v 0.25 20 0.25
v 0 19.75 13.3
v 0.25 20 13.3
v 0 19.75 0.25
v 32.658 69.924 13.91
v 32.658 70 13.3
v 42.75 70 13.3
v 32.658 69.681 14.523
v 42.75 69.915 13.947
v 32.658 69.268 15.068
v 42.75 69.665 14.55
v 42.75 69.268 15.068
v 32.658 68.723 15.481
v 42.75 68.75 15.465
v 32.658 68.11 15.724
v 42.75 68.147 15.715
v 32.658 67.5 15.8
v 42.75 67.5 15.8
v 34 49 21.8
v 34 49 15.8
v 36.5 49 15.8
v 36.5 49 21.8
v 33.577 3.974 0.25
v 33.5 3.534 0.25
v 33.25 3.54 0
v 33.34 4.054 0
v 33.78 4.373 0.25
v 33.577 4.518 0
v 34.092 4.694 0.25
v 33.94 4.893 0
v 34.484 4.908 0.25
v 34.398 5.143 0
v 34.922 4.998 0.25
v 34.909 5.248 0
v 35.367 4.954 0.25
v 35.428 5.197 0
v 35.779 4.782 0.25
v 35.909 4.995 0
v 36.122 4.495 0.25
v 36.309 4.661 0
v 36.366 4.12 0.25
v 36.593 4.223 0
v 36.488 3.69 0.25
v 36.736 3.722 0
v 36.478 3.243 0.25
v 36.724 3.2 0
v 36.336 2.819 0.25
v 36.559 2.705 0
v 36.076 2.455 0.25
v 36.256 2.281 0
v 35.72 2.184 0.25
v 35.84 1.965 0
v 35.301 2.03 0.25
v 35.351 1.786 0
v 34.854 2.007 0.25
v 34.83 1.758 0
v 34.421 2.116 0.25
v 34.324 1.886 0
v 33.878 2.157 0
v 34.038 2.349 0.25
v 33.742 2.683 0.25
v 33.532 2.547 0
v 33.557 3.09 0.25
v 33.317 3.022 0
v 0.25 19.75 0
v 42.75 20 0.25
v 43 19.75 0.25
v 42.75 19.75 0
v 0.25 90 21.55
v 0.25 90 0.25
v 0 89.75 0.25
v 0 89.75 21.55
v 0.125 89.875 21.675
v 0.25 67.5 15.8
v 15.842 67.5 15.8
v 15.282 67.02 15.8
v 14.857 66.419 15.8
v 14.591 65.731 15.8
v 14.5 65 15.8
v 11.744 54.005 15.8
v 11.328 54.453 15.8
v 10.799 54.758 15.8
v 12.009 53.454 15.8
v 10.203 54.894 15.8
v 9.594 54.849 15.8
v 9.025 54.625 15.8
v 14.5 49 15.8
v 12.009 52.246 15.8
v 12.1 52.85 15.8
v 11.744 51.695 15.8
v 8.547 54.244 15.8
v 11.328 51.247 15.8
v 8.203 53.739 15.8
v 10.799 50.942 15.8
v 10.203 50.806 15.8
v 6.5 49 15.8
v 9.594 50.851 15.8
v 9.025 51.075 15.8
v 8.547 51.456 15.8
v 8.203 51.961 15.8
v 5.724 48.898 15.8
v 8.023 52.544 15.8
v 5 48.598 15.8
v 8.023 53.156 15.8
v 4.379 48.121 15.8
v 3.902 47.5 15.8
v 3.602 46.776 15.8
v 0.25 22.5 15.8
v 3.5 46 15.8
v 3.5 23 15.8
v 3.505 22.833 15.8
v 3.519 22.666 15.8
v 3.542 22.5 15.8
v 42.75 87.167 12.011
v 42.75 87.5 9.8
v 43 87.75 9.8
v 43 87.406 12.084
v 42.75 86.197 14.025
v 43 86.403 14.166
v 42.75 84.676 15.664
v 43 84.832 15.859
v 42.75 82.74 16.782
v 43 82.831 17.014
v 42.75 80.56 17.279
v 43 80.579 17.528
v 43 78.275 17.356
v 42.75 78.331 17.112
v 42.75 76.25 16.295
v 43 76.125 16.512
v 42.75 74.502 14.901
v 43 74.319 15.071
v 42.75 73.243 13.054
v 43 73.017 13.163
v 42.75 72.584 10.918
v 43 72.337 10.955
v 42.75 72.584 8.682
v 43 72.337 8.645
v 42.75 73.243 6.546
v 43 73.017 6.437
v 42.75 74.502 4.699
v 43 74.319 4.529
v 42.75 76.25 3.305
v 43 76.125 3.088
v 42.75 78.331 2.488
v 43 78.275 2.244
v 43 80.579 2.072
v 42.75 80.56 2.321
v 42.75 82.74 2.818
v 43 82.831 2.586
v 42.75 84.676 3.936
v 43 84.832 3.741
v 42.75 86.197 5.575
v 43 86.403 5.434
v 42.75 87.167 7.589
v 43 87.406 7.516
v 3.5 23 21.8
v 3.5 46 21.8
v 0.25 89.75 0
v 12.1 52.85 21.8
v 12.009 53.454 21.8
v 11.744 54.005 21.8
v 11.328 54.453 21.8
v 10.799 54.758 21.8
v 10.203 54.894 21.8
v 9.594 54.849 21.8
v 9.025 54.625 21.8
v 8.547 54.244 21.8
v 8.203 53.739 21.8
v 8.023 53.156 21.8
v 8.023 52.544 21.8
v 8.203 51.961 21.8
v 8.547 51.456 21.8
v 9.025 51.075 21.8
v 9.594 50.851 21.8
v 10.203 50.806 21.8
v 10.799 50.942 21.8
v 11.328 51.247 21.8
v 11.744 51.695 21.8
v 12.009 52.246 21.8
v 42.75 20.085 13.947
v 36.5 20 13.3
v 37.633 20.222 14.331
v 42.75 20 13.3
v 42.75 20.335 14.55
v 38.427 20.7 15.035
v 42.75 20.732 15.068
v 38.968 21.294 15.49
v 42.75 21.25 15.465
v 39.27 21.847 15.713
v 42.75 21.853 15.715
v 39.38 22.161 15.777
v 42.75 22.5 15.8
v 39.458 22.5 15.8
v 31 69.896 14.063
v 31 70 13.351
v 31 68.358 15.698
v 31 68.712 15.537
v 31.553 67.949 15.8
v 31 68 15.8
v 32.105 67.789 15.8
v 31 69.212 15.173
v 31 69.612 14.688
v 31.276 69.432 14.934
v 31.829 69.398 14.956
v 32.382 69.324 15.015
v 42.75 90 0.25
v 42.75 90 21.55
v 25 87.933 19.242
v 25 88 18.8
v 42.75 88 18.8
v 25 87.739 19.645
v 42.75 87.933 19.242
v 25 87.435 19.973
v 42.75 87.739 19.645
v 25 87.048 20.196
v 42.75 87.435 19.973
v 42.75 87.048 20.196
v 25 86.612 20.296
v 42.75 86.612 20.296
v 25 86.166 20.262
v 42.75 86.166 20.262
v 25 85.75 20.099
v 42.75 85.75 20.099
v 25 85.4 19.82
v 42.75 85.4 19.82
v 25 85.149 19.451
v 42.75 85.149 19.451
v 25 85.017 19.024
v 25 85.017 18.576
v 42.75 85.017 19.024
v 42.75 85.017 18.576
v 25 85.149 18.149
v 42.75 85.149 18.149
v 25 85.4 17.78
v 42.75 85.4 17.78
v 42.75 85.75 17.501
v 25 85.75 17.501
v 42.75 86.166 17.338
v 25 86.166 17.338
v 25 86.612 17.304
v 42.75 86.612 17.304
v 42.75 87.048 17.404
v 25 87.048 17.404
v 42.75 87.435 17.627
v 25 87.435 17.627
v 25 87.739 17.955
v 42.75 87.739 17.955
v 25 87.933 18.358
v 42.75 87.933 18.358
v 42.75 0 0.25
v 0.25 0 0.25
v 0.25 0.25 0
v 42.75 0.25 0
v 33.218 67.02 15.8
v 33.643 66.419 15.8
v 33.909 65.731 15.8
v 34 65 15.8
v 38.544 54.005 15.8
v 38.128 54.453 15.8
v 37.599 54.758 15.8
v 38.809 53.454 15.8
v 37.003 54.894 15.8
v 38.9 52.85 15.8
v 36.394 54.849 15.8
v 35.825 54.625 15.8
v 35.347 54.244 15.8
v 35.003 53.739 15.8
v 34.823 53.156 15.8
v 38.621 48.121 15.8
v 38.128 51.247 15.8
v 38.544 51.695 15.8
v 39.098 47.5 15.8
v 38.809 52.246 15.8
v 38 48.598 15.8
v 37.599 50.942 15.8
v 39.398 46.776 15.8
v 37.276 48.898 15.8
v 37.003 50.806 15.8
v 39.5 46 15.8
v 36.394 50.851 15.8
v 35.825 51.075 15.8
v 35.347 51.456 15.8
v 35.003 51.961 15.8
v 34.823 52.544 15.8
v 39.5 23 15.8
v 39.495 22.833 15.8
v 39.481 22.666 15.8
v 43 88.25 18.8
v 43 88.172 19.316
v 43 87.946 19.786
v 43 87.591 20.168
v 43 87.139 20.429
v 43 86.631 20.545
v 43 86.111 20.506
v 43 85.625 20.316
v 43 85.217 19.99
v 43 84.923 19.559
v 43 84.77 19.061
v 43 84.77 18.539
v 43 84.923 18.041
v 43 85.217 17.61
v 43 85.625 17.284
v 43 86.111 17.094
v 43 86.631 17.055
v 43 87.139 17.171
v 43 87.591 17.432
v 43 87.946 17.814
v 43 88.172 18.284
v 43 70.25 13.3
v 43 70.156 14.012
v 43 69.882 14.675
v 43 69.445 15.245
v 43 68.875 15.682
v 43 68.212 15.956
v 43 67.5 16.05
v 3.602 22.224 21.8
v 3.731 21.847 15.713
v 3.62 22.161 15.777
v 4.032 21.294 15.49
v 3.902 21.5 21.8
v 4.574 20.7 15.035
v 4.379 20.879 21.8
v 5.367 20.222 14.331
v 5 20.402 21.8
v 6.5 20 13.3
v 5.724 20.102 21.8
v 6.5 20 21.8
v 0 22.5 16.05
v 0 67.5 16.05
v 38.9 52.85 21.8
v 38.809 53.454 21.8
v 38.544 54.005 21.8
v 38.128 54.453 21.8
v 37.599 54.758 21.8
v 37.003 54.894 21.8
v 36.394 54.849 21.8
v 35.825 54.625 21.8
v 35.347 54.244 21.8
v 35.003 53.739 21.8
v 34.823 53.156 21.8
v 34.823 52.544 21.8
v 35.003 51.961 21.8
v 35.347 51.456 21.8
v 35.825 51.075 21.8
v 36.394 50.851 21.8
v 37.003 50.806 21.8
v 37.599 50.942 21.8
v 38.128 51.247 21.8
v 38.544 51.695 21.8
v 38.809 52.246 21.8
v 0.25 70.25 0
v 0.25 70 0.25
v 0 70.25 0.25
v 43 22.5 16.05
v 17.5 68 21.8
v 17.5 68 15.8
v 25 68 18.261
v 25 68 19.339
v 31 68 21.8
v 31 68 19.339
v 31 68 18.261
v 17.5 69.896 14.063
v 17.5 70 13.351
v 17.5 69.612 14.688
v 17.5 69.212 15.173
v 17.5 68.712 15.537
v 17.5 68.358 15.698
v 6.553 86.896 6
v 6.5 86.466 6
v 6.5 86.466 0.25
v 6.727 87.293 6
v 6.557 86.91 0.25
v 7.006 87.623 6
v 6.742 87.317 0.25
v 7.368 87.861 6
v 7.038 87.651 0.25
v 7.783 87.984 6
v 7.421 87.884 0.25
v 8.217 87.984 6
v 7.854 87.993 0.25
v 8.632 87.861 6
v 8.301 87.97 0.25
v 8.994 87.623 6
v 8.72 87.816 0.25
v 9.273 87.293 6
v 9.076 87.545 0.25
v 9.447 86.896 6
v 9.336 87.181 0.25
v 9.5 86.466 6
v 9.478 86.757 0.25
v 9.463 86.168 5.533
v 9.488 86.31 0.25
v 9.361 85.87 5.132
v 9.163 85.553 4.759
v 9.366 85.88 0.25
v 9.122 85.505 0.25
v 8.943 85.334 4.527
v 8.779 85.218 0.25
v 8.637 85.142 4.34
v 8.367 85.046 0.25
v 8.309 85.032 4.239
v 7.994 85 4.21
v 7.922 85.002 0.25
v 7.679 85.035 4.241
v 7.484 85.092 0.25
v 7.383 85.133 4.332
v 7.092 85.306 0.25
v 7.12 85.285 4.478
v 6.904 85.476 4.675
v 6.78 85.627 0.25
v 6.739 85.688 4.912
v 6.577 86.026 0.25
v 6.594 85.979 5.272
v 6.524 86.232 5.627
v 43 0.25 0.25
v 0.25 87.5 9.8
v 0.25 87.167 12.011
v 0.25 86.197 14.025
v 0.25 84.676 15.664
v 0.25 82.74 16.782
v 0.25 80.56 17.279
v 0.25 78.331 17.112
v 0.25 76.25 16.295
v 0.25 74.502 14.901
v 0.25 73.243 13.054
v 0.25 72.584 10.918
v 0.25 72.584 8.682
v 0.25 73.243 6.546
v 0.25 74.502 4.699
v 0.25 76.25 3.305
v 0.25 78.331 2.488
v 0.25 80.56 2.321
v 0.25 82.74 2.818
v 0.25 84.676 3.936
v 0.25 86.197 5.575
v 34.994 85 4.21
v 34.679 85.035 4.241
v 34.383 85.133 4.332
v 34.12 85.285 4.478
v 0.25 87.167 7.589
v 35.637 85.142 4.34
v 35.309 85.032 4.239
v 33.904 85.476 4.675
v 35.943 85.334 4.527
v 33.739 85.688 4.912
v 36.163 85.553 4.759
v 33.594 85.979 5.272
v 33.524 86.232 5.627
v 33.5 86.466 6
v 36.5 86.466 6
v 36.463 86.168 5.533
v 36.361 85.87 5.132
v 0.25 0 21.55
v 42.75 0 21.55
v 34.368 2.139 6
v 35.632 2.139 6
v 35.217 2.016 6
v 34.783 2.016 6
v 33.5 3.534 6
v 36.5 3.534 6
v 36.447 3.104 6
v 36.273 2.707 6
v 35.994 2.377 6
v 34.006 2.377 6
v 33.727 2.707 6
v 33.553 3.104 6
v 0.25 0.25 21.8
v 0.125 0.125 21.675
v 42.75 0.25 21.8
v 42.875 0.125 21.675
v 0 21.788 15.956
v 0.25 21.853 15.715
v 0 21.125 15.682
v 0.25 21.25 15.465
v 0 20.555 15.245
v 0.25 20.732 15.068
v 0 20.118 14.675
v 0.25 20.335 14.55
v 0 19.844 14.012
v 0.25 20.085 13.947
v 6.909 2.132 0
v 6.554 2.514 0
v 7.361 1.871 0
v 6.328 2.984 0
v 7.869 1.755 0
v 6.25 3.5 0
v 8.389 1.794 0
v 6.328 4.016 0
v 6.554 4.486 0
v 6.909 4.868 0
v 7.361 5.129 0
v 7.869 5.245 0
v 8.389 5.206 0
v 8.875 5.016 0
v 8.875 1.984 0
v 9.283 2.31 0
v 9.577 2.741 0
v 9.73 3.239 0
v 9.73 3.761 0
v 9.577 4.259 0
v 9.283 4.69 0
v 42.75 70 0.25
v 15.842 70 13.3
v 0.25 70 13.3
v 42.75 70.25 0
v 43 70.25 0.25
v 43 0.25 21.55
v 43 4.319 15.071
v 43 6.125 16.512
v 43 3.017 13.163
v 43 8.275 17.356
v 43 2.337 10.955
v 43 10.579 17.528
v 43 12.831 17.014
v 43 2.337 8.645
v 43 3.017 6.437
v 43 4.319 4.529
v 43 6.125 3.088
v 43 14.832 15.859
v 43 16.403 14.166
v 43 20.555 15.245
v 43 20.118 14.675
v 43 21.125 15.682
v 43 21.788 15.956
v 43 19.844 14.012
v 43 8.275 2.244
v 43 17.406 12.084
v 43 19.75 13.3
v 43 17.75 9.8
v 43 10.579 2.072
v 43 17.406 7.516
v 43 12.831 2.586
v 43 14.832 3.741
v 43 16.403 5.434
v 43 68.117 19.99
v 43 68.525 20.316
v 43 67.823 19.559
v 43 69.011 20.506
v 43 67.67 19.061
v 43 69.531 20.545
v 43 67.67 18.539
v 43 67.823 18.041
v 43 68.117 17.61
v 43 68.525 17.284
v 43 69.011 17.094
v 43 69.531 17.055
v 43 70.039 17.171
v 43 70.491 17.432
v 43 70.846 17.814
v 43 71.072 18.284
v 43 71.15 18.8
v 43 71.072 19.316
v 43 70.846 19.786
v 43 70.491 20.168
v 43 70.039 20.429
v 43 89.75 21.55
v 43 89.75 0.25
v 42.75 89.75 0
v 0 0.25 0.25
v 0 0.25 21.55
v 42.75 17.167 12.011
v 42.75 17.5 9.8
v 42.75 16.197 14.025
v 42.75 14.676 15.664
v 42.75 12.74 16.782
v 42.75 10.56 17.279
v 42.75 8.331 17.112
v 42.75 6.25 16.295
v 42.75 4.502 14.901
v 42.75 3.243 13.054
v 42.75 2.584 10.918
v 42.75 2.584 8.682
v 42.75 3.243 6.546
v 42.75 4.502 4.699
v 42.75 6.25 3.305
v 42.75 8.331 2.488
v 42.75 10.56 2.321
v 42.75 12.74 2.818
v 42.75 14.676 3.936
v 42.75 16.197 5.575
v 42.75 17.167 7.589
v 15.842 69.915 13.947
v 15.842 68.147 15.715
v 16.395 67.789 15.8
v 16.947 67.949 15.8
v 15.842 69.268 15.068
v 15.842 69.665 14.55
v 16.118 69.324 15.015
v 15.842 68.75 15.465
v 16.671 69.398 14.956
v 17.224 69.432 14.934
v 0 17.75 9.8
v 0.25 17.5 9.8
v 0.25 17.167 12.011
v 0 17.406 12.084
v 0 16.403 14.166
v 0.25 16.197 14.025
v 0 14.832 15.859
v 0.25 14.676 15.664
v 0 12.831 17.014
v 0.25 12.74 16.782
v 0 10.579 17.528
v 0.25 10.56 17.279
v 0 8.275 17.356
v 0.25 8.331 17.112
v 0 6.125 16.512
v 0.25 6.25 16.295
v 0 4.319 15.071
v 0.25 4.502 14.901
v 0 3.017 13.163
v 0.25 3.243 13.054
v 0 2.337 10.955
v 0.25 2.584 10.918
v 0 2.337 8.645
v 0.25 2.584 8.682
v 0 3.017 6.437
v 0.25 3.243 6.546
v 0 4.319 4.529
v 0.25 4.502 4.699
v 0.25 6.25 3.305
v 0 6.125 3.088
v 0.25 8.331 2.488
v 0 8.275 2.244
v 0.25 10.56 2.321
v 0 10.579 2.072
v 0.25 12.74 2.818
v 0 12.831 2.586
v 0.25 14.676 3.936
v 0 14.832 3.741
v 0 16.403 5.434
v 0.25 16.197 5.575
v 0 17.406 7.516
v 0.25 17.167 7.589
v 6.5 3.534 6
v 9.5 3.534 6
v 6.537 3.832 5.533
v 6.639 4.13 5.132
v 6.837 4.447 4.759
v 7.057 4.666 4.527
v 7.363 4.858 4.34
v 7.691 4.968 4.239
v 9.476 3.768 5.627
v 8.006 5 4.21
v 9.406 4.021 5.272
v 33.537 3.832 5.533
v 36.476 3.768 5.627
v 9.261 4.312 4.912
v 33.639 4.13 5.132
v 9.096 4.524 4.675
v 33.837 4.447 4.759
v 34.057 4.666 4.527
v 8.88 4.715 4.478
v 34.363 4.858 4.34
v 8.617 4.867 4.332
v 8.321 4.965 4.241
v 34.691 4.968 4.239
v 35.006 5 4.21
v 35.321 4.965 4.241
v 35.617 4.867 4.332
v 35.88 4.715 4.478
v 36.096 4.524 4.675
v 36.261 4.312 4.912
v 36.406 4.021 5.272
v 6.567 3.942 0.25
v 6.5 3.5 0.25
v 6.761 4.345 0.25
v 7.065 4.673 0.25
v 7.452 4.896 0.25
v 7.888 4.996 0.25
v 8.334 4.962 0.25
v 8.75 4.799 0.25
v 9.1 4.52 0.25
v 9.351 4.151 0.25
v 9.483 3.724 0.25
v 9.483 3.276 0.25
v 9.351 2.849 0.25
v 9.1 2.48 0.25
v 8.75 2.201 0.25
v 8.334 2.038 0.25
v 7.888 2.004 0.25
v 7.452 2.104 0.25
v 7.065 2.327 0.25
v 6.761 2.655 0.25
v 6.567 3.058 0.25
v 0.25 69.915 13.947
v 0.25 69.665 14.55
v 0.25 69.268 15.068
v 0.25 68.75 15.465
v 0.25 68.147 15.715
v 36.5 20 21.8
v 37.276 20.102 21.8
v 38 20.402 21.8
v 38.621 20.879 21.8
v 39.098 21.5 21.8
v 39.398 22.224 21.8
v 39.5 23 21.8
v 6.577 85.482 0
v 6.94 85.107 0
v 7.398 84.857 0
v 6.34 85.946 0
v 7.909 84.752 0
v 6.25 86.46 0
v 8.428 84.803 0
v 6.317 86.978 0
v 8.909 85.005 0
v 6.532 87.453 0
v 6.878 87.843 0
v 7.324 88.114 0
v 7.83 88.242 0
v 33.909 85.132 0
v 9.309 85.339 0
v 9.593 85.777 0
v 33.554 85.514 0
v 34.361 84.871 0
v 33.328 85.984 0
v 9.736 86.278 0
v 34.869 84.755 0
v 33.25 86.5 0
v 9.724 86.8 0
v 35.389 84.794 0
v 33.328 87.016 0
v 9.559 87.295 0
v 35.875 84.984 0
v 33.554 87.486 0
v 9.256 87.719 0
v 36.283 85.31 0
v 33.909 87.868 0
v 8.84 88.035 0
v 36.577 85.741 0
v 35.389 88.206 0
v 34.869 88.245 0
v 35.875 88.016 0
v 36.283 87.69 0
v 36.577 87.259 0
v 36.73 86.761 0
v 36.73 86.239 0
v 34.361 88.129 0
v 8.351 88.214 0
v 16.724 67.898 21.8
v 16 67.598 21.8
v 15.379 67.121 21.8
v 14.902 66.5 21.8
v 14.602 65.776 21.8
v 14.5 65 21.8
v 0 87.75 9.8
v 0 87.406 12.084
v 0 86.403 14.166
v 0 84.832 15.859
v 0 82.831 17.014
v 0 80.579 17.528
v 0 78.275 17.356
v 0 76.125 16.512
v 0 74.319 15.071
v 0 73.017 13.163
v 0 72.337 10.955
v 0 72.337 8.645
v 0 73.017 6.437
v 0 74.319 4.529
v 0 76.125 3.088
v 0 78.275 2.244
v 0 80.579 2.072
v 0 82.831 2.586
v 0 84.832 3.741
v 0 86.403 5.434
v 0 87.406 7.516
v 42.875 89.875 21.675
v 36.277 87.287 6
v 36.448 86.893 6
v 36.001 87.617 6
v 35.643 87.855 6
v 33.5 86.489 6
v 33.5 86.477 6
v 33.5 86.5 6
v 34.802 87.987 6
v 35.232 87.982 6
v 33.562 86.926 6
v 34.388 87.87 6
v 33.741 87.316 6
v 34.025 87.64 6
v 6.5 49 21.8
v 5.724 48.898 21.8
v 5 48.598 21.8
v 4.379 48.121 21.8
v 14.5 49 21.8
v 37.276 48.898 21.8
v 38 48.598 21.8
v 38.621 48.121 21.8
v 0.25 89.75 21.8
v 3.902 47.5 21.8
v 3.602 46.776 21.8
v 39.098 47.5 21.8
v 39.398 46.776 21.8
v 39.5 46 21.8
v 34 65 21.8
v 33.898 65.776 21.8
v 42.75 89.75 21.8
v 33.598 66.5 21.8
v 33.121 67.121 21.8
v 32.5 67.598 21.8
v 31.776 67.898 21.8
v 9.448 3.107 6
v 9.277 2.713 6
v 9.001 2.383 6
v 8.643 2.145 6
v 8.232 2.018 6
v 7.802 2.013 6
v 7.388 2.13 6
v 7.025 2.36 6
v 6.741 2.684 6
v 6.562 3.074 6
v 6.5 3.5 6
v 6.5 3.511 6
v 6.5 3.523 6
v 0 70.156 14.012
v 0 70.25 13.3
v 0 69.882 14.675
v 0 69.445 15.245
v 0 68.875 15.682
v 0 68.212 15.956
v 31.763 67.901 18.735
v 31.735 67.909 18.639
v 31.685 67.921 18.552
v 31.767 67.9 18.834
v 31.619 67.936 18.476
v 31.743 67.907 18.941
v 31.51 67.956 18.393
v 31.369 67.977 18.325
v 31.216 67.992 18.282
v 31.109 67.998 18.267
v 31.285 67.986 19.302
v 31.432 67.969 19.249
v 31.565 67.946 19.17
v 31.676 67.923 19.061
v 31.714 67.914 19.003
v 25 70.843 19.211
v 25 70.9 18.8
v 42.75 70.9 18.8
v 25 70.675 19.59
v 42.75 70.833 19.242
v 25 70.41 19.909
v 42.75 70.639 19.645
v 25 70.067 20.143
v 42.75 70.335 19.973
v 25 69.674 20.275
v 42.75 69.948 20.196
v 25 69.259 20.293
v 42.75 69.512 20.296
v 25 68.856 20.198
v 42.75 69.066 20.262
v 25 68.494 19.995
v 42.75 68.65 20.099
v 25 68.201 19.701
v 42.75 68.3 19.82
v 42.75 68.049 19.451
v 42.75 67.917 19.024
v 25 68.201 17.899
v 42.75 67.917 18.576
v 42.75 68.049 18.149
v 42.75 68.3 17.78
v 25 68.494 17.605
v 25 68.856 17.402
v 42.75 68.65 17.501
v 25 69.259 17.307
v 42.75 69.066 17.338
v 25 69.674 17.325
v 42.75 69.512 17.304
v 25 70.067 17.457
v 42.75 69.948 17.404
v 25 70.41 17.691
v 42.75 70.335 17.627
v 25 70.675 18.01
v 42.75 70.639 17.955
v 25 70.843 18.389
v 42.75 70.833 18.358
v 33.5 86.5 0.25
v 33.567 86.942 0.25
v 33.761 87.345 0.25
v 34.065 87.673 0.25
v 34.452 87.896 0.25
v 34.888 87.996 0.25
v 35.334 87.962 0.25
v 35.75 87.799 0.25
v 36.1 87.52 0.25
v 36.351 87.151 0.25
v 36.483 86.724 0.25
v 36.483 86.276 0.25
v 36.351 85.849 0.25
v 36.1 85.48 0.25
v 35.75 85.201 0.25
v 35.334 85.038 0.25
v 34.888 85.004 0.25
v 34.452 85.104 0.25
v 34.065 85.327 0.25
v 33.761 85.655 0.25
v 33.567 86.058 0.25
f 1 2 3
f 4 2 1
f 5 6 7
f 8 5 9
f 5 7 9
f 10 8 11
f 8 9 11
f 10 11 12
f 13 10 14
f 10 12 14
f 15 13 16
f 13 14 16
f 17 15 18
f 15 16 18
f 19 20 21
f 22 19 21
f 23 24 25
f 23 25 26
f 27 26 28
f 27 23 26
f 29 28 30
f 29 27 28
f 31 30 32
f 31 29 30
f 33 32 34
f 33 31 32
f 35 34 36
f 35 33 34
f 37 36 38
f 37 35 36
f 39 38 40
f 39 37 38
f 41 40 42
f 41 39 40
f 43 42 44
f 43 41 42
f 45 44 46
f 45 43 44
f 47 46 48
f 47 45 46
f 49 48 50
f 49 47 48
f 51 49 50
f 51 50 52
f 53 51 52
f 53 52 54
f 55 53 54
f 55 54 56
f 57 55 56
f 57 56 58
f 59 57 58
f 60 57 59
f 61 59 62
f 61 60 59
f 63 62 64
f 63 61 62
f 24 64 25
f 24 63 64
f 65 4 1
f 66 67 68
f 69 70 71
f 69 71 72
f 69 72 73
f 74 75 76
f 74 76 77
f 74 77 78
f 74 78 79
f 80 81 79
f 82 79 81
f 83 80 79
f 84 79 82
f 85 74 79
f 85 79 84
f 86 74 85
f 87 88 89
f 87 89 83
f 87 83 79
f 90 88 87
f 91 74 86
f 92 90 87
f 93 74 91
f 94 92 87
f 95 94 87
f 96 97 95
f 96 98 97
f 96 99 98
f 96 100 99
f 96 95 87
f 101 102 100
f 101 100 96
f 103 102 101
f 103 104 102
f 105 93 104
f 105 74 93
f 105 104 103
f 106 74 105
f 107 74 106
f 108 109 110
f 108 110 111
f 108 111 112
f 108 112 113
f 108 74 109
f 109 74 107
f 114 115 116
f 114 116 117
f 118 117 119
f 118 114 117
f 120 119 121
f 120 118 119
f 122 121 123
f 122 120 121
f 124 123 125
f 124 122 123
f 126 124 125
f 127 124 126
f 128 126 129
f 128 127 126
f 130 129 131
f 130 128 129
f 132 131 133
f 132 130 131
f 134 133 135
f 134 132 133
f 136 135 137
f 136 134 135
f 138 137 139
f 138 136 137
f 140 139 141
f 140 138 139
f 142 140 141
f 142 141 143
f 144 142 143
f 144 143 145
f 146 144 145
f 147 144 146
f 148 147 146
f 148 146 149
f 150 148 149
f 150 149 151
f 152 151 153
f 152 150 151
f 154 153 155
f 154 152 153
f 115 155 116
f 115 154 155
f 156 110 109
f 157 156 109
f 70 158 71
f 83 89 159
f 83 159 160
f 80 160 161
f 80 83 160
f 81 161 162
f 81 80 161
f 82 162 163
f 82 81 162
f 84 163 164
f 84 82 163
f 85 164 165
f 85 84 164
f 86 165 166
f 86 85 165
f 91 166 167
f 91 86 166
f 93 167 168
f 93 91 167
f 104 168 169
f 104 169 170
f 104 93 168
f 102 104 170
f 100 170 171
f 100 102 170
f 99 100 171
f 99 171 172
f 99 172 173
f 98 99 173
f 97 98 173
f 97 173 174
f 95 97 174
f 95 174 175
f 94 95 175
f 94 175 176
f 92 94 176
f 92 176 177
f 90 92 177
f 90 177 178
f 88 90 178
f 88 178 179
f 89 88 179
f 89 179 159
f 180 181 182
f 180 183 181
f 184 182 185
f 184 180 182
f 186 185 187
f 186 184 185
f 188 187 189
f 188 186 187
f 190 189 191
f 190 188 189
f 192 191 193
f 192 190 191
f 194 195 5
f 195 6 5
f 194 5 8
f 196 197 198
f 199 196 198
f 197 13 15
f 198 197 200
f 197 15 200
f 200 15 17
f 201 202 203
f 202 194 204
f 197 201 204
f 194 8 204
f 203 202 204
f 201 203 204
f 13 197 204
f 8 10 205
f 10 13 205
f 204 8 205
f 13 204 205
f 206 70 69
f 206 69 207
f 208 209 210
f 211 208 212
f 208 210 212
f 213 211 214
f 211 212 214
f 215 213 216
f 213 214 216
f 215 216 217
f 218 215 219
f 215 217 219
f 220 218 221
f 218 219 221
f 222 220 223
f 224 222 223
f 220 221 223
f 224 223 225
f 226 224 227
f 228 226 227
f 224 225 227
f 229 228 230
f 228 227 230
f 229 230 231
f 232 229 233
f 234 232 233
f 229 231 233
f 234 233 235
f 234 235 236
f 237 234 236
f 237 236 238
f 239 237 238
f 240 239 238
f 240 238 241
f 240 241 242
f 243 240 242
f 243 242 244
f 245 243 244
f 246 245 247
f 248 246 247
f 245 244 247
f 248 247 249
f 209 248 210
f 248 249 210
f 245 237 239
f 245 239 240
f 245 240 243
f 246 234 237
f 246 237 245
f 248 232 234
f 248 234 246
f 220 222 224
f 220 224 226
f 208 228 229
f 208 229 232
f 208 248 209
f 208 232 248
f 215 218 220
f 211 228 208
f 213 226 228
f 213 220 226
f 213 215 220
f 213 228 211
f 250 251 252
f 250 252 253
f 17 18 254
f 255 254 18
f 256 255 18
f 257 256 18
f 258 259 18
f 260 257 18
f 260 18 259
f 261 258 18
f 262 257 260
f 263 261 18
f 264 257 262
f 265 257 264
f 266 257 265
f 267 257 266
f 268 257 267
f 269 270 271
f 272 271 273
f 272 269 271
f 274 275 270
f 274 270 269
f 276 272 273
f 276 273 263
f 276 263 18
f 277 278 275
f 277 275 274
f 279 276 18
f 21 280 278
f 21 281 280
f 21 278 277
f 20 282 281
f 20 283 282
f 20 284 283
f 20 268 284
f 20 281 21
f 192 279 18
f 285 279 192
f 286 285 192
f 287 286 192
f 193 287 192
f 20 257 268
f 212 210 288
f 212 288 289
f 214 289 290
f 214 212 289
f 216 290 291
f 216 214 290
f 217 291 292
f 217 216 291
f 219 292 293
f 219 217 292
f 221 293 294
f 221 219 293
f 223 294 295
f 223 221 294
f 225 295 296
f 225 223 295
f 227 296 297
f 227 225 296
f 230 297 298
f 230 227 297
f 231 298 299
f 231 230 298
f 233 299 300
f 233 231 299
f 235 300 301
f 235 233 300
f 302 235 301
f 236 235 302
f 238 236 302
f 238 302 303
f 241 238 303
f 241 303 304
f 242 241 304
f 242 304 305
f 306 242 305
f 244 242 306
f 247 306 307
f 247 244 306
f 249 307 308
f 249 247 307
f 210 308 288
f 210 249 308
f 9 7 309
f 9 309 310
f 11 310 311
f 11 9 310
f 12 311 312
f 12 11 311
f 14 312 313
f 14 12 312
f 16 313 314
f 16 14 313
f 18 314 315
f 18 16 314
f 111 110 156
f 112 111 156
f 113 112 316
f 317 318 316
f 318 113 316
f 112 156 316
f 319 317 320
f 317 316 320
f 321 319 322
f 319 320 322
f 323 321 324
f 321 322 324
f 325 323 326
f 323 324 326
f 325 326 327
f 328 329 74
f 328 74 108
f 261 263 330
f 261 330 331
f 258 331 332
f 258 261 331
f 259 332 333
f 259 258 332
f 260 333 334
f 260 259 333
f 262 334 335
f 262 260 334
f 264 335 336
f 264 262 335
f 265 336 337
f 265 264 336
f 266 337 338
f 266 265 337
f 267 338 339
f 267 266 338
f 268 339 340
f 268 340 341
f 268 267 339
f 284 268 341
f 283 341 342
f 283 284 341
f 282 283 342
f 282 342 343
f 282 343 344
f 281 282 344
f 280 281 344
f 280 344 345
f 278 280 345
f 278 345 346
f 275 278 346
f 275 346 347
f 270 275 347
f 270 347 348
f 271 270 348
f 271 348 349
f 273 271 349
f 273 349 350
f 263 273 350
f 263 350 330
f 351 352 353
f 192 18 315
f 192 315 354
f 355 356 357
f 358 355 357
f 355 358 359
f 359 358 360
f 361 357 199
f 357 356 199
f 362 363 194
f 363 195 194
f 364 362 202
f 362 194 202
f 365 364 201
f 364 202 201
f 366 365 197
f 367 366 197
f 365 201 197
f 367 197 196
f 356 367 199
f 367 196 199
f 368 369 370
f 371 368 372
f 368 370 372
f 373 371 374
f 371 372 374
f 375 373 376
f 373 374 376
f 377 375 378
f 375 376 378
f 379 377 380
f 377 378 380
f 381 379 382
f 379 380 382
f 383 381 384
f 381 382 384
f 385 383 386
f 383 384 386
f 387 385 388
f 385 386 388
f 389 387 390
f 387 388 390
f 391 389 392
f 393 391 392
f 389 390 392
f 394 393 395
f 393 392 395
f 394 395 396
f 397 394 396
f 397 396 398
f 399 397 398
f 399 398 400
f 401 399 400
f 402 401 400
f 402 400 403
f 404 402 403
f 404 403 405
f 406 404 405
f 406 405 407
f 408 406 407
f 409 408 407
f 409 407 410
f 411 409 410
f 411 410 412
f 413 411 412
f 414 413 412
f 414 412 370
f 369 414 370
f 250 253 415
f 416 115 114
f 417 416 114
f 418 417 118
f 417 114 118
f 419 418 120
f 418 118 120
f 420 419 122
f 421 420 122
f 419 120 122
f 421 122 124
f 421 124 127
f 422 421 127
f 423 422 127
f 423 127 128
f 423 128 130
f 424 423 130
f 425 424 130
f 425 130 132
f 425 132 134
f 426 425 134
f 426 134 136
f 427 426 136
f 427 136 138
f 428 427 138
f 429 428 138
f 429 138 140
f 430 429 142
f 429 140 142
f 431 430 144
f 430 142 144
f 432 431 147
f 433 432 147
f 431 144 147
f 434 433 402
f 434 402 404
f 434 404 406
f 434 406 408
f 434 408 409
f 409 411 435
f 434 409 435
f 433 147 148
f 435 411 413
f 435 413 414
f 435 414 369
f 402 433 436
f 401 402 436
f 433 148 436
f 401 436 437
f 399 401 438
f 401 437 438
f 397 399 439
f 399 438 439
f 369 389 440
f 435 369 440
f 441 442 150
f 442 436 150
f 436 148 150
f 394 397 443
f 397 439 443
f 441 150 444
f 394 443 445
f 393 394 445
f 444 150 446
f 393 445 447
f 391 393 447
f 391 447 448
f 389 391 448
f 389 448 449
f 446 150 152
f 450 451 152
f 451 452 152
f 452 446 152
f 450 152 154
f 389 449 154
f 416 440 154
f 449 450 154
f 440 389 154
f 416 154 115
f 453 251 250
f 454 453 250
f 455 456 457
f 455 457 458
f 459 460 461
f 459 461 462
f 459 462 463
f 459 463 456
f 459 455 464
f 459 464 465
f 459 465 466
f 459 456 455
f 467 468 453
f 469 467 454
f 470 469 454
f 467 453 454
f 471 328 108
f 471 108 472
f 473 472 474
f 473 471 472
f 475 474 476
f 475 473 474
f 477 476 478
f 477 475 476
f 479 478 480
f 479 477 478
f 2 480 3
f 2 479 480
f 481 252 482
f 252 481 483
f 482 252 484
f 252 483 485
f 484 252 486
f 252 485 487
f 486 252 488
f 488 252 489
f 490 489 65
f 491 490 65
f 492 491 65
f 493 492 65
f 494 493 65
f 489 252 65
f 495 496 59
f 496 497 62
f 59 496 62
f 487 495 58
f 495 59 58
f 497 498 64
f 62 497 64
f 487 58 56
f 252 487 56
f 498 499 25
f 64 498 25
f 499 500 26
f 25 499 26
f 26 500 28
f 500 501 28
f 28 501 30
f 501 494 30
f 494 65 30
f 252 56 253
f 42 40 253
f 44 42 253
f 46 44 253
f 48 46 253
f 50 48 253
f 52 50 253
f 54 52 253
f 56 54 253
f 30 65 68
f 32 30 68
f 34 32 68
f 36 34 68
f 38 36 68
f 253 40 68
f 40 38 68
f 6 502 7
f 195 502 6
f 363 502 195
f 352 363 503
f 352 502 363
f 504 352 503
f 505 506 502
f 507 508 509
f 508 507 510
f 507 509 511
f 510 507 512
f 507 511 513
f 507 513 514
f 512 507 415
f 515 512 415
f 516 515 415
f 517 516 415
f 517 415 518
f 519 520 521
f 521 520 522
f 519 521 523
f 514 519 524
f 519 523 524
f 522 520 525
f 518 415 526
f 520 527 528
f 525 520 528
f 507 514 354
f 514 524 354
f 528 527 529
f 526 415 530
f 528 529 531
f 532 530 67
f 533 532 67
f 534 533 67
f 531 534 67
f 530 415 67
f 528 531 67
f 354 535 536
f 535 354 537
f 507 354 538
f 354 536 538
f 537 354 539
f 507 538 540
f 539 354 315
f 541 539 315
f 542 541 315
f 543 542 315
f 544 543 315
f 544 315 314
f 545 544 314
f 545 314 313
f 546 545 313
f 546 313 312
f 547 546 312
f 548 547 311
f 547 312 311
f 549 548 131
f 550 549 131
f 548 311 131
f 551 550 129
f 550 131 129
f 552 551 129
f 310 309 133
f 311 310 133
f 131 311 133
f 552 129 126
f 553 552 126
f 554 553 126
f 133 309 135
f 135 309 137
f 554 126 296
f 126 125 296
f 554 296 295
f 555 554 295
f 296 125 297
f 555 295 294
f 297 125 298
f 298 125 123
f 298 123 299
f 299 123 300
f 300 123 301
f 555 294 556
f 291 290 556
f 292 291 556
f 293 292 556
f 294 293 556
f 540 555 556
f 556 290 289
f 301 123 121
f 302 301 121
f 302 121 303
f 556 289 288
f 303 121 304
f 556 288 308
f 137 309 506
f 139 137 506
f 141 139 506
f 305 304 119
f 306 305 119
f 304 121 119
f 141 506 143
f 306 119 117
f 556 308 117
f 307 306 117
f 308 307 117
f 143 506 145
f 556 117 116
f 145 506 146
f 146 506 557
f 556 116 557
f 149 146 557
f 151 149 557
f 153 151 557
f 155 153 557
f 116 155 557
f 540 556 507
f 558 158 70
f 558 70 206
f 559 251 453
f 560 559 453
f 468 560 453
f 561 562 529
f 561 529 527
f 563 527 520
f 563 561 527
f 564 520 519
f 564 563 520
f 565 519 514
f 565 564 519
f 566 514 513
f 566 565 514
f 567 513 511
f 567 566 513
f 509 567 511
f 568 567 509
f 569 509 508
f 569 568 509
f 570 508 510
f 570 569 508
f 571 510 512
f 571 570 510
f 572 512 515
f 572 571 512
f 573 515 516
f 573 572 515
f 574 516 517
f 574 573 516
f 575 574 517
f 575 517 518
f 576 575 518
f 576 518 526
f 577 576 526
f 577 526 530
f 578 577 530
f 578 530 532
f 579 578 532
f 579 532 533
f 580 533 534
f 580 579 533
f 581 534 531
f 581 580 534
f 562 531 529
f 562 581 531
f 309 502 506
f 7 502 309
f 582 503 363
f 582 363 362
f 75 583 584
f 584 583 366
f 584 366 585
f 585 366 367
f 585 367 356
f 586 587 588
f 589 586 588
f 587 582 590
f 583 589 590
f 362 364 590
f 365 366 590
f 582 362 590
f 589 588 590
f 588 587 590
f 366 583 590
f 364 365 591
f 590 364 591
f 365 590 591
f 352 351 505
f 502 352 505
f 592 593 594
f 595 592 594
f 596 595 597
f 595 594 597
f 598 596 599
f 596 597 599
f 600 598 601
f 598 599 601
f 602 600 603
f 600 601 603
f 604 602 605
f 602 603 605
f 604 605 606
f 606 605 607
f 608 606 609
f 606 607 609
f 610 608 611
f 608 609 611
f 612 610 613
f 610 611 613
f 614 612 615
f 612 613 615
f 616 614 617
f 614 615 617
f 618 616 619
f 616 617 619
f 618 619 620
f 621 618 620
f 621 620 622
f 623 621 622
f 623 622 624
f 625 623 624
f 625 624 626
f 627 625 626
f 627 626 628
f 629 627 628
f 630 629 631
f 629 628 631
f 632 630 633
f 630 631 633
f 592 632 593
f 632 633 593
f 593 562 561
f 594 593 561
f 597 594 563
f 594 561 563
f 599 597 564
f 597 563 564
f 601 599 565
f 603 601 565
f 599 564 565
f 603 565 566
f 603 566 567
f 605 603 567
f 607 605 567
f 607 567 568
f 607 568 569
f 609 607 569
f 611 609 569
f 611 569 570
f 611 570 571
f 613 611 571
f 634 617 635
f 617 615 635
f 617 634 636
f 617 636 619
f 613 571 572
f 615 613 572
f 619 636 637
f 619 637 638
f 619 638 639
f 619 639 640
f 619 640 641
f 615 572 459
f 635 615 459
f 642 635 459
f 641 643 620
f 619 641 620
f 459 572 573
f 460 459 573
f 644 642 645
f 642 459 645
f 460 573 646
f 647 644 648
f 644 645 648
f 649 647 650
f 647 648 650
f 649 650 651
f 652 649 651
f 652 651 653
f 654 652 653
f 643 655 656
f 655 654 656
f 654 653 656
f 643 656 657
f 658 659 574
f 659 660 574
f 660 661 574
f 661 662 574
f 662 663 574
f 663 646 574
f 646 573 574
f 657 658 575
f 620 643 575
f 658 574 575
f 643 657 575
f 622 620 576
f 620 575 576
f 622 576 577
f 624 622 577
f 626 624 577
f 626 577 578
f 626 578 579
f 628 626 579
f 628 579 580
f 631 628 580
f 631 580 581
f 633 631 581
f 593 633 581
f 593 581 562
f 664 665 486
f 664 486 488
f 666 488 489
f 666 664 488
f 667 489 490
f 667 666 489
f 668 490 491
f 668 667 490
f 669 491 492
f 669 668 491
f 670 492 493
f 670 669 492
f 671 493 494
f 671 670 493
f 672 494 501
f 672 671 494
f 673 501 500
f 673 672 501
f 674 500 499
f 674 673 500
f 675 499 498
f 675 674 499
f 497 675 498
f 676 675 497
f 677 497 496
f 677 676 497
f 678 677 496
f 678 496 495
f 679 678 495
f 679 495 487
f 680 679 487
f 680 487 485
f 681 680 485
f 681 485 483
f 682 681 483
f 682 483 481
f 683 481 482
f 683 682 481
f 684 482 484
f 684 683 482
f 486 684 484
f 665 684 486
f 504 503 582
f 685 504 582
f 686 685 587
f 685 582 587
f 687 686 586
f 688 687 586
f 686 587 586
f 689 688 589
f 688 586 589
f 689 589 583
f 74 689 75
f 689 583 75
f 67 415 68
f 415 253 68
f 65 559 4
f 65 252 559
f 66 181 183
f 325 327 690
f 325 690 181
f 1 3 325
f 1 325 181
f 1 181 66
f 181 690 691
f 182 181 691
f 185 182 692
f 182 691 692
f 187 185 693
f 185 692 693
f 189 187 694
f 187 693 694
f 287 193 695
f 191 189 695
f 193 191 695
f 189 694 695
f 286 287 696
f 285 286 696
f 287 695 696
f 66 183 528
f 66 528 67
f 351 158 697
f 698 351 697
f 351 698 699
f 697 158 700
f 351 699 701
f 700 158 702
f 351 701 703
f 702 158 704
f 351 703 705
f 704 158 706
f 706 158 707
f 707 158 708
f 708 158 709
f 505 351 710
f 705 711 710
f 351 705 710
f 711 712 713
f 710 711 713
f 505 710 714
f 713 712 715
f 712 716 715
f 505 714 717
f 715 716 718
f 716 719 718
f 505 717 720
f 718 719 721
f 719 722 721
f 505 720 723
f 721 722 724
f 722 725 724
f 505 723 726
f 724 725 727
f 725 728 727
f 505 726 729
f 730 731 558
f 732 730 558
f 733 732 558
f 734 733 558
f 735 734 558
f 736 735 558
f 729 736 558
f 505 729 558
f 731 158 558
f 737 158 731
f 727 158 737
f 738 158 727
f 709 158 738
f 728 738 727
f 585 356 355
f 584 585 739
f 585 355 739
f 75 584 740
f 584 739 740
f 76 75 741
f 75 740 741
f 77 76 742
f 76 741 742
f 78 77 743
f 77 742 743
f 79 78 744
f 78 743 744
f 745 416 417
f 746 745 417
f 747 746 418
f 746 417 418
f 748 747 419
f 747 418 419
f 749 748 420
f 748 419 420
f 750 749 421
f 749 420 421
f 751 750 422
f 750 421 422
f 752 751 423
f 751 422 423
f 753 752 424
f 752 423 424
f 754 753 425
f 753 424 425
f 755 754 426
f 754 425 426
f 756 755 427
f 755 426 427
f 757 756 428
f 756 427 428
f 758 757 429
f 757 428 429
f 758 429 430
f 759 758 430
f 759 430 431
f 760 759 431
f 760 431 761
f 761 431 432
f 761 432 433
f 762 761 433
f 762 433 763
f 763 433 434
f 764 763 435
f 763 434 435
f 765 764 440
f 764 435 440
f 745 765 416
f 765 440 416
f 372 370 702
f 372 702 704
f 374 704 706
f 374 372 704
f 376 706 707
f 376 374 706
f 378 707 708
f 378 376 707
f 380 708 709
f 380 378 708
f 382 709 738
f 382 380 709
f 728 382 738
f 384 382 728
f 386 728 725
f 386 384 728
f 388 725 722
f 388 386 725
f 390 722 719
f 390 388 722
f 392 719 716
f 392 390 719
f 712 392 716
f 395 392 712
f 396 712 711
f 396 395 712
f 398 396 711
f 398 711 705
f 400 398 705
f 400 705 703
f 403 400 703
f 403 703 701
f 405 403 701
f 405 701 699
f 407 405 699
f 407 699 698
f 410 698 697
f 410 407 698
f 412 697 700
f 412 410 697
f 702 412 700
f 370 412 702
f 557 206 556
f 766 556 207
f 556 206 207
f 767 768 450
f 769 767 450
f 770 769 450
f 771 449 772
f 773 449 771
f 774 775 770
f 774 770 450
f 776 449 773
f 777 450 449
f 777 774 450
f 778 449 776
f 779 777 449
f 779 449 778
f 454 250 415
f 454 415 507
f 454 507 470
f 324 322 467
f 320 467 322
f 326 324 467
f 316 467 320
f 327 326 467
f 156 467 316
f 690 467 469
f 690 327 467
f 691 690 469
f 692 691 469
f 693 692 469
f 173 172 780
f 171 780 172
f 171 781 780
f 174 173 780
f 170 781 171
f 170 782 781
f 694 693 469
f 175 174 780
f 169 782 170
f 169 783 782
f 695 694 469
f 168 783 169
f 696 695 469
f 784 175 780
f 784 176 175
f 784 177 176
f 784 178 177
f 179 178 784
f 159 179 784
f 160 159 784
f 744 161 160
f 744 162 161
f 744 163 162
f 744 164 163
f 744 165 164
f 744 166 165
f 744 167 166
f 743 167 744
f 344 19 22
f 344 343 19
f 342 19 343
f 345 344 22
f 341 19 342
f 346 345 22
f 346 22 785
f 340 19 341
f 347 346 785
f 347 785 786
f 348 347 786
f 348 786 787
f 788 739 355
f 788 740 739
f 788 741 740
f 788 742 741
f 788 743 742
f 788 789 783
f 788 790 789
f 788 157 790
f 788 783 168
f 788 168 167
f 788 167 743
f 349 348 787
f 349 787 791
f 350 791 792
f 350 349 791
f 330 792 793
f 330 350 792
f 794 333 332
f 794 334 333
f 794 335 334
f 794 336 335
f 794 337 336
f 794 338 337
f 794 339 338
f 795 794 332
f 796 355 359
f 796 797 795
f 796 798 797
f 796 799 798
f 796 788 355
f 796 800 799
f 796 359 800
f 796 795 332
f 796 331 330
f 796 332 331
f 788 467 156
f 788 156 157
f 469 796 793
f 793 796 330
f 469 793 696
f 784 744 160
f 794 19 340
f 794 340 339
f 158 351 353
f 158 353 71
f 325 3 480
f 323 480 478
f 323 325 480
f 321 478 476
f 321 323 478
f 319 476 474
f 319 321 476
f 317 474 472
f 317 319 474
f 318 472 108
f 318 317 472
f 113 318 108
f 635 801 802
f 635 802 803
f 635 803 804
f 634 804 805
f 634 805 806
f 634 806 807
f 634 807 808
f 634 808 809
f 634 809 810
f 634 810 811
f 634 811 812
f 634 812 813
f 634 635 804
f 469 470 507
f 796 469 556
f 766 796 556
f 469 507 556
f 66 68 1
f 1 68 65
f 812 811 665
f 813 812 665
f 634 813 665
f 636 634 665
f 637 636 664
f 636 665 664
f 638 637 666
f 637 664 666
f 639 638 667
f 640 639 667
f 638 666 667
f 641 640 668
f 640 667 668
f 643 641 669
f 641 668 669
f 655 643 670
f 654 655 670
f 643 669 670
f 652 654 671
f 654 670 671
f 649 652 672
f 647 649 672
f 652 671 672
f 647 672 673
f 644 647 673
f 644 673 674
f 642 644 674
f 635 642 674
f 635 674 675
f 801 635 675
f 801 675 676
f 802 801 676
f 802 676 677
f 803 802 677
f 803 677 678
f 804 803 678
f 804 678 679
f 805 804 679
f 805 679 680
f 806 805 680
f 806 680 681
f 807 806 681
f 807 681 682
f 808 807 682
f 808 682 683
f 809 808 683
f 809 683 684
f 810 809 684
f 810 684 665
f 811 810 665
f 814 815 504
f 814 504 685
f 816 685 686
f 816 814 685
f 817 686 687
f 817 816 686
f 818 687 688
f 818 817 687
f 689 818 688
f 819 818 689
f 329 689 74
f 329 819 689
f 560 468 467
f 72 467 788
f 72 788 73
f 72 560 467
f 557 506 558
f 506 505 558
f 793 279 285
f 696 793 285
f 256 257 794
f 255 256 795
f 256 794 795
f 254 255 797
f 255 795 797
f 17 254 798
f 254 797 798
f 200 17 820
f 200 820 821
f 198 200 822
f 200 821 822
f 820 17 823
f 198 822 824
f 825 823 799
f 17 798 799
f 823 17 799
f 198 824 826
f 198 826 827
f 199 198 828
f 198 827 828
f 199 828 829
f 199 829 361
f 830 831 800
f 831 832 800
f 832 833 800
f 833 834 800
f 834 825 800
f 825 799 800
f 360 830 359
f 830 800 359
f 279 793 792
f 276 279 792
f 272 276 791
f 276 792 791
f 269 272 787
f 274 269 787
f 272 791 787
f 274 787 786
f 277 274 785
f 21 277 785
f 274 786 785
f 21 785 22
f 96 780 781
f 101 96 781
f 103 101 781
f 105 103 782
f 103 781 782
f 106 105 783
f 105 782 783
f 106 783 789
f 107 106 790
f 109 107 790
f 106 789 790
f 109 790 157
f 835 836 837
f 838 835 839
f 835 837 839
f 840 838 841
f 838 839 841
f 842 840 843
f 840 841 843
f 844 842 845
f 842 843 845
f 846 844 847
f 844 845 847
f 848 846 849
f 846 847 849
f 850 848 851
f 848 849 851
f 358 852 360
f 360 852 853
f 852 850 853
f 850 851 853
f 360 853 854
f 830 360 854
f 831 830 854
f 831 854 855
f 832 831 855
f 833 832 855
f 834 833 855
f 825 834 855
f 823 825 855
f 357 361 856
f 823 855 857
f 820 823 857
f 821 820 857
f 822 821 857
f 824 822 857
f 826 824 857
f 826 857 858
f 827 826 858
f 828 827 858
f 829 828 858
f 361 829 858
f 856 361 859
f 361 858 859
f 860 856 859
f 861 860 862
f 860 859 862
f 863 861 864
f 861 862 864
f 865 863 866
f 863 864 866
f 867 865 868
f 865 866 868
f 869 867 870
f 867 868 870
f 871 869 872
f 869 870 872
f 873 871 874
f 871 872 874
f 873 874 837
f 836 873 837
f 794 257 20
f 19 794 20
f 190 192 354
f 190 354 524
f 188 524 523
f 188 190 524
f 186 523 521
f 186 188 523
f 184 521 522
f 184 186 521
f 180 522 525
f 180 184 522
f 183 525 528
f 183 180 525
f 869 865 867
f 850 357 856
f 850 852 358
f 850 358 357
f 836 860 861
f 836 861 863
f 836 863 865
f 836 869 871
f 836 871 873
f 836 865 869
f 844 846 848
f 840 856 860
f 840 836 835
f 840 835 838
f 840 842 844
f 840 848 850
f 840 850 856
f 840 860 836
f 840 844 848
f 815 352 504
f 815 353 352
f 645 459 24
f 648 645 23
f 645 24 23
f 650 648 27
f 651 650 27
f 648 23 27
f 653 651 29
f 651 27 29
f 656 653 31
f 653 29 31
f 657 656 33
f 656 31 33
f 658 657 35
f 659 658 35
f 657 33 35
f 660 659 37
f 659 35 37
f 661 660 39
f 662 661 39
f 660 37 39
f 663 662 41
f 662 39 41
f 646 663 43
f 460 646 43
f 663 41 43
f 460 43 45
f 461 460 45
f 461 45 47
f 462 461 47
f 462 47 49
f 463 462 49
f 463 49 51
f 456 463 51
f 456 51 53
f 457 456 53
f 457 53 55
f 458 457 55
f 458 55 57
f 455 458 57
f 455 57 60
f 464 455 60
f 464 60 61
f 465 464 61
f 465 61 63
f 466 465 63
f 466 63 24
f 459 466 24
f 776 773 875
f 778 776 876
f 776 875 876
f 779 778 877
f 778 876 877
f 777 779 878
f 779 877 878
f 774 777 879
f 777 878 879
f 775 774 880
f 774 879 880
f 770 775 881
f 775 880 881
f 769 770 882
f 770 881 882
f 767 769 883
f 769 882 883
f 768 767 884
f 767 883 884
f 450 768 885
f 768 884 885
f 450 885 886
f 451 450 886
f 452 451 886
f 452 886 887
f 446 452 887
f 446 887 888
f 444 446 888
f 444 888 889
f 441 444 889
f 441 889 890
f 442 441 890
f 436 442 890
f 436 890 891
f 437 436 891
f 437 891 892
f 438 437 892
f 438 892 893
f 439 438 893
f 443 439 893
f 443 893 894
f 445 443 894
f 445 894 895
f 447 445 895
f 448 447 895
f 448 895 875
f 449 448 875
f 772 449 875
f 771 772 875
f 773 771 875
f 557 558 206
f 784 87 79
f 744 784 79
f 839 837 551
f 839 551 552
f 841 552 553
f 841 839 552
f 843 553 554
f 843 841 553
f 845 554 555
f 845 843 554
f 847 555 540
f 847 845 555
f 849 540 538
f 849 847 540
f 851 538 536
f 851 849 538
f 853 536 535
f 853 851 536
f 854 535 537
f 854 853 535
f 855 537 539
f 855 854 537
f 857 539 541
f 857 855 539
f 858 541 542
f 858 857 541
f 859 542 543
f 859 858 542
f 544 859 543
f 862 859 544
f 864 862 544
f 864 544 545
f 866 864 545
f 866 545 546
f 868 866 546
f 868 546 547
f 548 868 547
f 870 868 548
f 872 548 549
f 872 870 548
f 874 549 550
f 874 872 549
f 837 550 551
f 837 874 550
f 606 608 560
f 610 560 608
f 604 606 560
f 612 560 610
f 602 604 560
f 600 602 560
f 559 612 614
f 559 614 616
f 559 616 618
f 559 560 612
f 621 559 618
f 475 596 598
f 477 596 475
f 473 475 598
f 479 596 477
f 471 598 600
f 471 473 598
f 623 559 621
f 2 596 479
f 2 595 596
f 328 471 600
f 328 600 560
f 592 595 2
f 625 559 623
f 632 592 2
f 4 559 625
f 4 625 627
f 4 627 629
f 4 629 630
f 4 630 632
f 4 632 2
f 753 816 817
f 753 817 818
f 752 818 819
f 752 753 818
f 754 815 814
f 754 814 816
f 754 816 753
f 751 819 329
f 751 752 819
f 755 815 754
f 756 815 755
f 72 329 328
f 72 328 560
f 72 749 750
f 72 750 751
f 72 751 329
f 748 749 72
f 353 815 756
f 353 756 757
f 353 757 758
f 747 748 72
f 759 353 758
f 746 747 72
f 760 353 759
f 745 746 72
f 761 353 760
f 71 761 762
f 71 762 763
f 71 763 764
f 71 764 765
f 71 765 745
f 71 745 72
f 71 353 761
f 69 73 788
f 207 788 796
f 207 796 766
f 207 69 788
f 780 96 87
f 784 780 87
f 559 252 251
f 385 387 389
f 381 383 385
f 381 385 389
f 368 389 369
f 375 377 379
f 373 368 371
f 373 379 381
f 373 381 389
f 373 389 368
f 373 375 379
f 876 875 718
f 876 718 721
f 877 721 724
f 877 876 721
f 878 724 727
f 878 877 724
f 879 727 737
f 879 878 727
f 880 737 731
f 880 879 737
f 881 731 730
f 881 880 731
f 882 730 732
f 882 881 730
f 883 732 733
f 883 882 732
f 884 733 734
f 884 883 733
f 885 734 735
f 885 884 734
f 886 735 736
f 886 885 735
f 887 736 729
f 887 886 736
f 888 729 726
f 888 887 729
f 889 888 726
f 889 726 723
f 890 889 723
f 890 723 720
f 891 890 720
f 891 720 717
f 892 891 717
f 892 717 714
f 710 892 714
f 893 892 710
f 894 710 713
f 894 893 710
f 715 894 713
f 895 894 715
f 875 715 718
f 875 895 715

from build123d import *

# Parameters (mm, degrees)
MODEL_W                  = 43
MODEL_H                  = 90
MODEL_R                  = 2.05
EXTRUDE_1_DEPTH          = 21.8
FILLET_1_R               = 3
CUT_EXTRUDE_1_DEPTH      = 103.099167479
CUT_EXTRUDE_1_DEPTH_BACK = 103.099167479
FILLET_2_R               = 2.5
SKETCH_3_R               = 7.5
CUT_EXTRUDE_2_DEPTH      = 103.099167543
SKETCH_3_6_R             = 1.5
CUT_EXTRUDE_5_DEPTH      = 18
SKETCH_8_R               = 1.5
CUT_EXTRUDE_7_DEPTH      = 6
CHAMFER_3_SIZE           = 0.25
CHAMFER_4_SIZE           = 0.25


with BuildPart() as part:
    # Model → Бобышка-Вытянуть1 (new body)
    with BuildSketch(Plane.XY):
        with Locations((21.5, 45)):
            Rectangle(MODEL_W, MODEL_H)
        with Locations((10.05, 52.85)):
            Circle(MODEL_R, mode=Mode.SUBTRACT)
        with Locations((36.85, 52.85)):
            Circle(MODEL_R, mode=Mode.SUBTRACT)
        Polygon((14.5, 49), (14.5, 68), (34, 68), (34, 49), (39.5, 49), (39.5, 20), (3.5, 20), (3.5, 49), align=None, mode=Mode.SUBTRACT)
    extrude(amount=EXTRUDE_1_DEPTH)

    # Скругление1
    fillet_1_edges = [part.edges().sort_by_distance(p)[0] for p in [
        (3.5, 49, 10.9),
        (3.5, 20, 10.9),
        (39.5, 20, 10.9),
        (39.5, 49, 10.9),
        (34, 68, 10.9),
        (14.5, 68, 10.9),
    ]]
    fillet(fillet_1_edges, radius=FILLET_1_R)

    # Эскиз2 → Вырез-Вытянуть1 (cut, two sides: drawn at the far end of the back side and taken through both)
    with BuildSketch(Plane(origin=(43, 0, 0), x_dir=(0, 0, -1), z_dir=(1, 0, 0)).offset(-CUT_EXTRUDE_1_DEPTH_BACK)):
        Polygon((156.632056522, 70), (0, 70), (-15.8, 70), (-15.8, 20), (0, 20), (156.632056522, 20), (469.896169567, 20), (469.896169567, 70), align=None)
    extrude(amount=CUT_EXTRUDE_1_DEPTH + CUT_EXTRUDE_1_DEPTH_BACK, mode=Mode.SUBTRACT)

    # Скругление2
    fillet_2_edges = [part.edges().sort_by_distance(p)[0] for p in [
        (21.5, 70, 15.8),
        (3.25, 20, 15.8),
        (39.75, 20, 15.8),
    ]]
    fillet(fillet_2_edges, radius=FILLET_2_R - 0.0001)  # a hair under: the kernel refuses the full size

    # Эскиз3 → Вырез-Вытянуть2 (cut, through all)
    with BuildSketch(Plane(origin=(43, 0, 0), x_dir=(0, 0, -1), z_dir=(1, 0, 0))):
        with Locations(Location((-9.8, 80, 0), (0, 0, 90))):
            Circle(SKETCH_3_R)
        with Locations(Location((-9.8, 10, 0), (0, 0, 90))):
            Circle(SKETCH_3_R)
    extrude(amount=-CUT_EXTRUDE_2_DEPTH, mode=Mode.SUBTRACT)

    # Эскиз3<6> → Вырез-Вытянуть5 (cut)
    with BuildSketch(Plane(origin=(43, 0, 0), x_dir=(0, 0, -1), z_dir=(1, 0, 0))):
        with Locations(Location((-18.8, 86.5, 0), (0, 0, 90))):
            Circle(SKETCH_3_6_R)
        with Locations(Location((-18.8, 69.4, 0), (0, 0, 90))):
            Circle(SKETCH_3_6_R)
    extrude(amount=-CUT_EXTRUDE_5_DEPTH, mode=Mode.SUBTRACT)

    # Эскиз8 → Вырез-Вытянуть7 (cut)
    with BuildSketch(Plane(origin=(0, 0, 0), x_dir=(-1, 0, 0), z_dir=(0, 0, -1))):
        with Locations((-35, 86.5)):
            Circle(SKETCH_8_R)
        with Locations(Location((-8, 86.5, 0), (0, 0, 358.703677977))):
            Circle(SKETCH_8_R)
        with Locations((-8, 3.5)):
            Circle(SKETCH_8_R)
        with Locations(Location((-35, 3.5, 0), (0, 0, 1.296322023))):
            Circle(SKETCH_8_R)
    extrude(amount=-CUT_EXTRUDE_7_DEPTH, mode=Mode.SUBTRACT)

    # Фаска3
    chamfer_3_edges = [part.edges().sort_by_distance(p)[0] for p in [
        (43, 80, 0),
        (43, 70, 6.65005),
        (0, 10, 0),
        (0, 20, 6.65005),
        (21.5, 70, 0),
        (0, 70, 6.65005),
        (43, 45, 21.8),
        (0, 45, 15.8),
        (43, 45, 15.8),
        (43, 20, 6.65005),
        (0, 69.267796242, 15.067796242),
        (43, 69.267796242, 15.067796242),
        (43, 20.732203758, 15.067796242),
        (0, 20.732203758, 15.067796242),
        (43, 2.5, 9.8),
        (0, 2.5, 9.8),
        (0, 72.5, 9.8),
        (43, 72.5, 9.8),
        (43, 85, 18.8),
        (43, 67.9, 18.8),
        (36.5, 86.5, 0),
        (9.499616095, 86.533934736, 0),
        (9.5, 3.5, 0),
        (36.499616095, 3.466065264, 0),
        (43, 10, 0),
        (21.5, 0, 0),
        (21.5, 20, 0),
        (0, 80, 0),
        (21.5, 90, 0),
        (0, 45, 21.8),
        (43, 90, 10.9),
        (43, 0, 10.9),
        (0, 0, 10.9),
        (0, 90, 10.9),
    ]]
    chamfer(chamfer_3_edges, length=CHAMFER_3_SIZE)

    # Фаска4
    chamfer_4_edges = [part.edges().sort_by_distance(p)[0] for p in [
        (21.5, 90, 21.8),
        (21.5, 0, 21.8),
    ]]
    chamfer(chamfer_4_edges, length=CHAMFER_4_SIZE)


solid = part.part
